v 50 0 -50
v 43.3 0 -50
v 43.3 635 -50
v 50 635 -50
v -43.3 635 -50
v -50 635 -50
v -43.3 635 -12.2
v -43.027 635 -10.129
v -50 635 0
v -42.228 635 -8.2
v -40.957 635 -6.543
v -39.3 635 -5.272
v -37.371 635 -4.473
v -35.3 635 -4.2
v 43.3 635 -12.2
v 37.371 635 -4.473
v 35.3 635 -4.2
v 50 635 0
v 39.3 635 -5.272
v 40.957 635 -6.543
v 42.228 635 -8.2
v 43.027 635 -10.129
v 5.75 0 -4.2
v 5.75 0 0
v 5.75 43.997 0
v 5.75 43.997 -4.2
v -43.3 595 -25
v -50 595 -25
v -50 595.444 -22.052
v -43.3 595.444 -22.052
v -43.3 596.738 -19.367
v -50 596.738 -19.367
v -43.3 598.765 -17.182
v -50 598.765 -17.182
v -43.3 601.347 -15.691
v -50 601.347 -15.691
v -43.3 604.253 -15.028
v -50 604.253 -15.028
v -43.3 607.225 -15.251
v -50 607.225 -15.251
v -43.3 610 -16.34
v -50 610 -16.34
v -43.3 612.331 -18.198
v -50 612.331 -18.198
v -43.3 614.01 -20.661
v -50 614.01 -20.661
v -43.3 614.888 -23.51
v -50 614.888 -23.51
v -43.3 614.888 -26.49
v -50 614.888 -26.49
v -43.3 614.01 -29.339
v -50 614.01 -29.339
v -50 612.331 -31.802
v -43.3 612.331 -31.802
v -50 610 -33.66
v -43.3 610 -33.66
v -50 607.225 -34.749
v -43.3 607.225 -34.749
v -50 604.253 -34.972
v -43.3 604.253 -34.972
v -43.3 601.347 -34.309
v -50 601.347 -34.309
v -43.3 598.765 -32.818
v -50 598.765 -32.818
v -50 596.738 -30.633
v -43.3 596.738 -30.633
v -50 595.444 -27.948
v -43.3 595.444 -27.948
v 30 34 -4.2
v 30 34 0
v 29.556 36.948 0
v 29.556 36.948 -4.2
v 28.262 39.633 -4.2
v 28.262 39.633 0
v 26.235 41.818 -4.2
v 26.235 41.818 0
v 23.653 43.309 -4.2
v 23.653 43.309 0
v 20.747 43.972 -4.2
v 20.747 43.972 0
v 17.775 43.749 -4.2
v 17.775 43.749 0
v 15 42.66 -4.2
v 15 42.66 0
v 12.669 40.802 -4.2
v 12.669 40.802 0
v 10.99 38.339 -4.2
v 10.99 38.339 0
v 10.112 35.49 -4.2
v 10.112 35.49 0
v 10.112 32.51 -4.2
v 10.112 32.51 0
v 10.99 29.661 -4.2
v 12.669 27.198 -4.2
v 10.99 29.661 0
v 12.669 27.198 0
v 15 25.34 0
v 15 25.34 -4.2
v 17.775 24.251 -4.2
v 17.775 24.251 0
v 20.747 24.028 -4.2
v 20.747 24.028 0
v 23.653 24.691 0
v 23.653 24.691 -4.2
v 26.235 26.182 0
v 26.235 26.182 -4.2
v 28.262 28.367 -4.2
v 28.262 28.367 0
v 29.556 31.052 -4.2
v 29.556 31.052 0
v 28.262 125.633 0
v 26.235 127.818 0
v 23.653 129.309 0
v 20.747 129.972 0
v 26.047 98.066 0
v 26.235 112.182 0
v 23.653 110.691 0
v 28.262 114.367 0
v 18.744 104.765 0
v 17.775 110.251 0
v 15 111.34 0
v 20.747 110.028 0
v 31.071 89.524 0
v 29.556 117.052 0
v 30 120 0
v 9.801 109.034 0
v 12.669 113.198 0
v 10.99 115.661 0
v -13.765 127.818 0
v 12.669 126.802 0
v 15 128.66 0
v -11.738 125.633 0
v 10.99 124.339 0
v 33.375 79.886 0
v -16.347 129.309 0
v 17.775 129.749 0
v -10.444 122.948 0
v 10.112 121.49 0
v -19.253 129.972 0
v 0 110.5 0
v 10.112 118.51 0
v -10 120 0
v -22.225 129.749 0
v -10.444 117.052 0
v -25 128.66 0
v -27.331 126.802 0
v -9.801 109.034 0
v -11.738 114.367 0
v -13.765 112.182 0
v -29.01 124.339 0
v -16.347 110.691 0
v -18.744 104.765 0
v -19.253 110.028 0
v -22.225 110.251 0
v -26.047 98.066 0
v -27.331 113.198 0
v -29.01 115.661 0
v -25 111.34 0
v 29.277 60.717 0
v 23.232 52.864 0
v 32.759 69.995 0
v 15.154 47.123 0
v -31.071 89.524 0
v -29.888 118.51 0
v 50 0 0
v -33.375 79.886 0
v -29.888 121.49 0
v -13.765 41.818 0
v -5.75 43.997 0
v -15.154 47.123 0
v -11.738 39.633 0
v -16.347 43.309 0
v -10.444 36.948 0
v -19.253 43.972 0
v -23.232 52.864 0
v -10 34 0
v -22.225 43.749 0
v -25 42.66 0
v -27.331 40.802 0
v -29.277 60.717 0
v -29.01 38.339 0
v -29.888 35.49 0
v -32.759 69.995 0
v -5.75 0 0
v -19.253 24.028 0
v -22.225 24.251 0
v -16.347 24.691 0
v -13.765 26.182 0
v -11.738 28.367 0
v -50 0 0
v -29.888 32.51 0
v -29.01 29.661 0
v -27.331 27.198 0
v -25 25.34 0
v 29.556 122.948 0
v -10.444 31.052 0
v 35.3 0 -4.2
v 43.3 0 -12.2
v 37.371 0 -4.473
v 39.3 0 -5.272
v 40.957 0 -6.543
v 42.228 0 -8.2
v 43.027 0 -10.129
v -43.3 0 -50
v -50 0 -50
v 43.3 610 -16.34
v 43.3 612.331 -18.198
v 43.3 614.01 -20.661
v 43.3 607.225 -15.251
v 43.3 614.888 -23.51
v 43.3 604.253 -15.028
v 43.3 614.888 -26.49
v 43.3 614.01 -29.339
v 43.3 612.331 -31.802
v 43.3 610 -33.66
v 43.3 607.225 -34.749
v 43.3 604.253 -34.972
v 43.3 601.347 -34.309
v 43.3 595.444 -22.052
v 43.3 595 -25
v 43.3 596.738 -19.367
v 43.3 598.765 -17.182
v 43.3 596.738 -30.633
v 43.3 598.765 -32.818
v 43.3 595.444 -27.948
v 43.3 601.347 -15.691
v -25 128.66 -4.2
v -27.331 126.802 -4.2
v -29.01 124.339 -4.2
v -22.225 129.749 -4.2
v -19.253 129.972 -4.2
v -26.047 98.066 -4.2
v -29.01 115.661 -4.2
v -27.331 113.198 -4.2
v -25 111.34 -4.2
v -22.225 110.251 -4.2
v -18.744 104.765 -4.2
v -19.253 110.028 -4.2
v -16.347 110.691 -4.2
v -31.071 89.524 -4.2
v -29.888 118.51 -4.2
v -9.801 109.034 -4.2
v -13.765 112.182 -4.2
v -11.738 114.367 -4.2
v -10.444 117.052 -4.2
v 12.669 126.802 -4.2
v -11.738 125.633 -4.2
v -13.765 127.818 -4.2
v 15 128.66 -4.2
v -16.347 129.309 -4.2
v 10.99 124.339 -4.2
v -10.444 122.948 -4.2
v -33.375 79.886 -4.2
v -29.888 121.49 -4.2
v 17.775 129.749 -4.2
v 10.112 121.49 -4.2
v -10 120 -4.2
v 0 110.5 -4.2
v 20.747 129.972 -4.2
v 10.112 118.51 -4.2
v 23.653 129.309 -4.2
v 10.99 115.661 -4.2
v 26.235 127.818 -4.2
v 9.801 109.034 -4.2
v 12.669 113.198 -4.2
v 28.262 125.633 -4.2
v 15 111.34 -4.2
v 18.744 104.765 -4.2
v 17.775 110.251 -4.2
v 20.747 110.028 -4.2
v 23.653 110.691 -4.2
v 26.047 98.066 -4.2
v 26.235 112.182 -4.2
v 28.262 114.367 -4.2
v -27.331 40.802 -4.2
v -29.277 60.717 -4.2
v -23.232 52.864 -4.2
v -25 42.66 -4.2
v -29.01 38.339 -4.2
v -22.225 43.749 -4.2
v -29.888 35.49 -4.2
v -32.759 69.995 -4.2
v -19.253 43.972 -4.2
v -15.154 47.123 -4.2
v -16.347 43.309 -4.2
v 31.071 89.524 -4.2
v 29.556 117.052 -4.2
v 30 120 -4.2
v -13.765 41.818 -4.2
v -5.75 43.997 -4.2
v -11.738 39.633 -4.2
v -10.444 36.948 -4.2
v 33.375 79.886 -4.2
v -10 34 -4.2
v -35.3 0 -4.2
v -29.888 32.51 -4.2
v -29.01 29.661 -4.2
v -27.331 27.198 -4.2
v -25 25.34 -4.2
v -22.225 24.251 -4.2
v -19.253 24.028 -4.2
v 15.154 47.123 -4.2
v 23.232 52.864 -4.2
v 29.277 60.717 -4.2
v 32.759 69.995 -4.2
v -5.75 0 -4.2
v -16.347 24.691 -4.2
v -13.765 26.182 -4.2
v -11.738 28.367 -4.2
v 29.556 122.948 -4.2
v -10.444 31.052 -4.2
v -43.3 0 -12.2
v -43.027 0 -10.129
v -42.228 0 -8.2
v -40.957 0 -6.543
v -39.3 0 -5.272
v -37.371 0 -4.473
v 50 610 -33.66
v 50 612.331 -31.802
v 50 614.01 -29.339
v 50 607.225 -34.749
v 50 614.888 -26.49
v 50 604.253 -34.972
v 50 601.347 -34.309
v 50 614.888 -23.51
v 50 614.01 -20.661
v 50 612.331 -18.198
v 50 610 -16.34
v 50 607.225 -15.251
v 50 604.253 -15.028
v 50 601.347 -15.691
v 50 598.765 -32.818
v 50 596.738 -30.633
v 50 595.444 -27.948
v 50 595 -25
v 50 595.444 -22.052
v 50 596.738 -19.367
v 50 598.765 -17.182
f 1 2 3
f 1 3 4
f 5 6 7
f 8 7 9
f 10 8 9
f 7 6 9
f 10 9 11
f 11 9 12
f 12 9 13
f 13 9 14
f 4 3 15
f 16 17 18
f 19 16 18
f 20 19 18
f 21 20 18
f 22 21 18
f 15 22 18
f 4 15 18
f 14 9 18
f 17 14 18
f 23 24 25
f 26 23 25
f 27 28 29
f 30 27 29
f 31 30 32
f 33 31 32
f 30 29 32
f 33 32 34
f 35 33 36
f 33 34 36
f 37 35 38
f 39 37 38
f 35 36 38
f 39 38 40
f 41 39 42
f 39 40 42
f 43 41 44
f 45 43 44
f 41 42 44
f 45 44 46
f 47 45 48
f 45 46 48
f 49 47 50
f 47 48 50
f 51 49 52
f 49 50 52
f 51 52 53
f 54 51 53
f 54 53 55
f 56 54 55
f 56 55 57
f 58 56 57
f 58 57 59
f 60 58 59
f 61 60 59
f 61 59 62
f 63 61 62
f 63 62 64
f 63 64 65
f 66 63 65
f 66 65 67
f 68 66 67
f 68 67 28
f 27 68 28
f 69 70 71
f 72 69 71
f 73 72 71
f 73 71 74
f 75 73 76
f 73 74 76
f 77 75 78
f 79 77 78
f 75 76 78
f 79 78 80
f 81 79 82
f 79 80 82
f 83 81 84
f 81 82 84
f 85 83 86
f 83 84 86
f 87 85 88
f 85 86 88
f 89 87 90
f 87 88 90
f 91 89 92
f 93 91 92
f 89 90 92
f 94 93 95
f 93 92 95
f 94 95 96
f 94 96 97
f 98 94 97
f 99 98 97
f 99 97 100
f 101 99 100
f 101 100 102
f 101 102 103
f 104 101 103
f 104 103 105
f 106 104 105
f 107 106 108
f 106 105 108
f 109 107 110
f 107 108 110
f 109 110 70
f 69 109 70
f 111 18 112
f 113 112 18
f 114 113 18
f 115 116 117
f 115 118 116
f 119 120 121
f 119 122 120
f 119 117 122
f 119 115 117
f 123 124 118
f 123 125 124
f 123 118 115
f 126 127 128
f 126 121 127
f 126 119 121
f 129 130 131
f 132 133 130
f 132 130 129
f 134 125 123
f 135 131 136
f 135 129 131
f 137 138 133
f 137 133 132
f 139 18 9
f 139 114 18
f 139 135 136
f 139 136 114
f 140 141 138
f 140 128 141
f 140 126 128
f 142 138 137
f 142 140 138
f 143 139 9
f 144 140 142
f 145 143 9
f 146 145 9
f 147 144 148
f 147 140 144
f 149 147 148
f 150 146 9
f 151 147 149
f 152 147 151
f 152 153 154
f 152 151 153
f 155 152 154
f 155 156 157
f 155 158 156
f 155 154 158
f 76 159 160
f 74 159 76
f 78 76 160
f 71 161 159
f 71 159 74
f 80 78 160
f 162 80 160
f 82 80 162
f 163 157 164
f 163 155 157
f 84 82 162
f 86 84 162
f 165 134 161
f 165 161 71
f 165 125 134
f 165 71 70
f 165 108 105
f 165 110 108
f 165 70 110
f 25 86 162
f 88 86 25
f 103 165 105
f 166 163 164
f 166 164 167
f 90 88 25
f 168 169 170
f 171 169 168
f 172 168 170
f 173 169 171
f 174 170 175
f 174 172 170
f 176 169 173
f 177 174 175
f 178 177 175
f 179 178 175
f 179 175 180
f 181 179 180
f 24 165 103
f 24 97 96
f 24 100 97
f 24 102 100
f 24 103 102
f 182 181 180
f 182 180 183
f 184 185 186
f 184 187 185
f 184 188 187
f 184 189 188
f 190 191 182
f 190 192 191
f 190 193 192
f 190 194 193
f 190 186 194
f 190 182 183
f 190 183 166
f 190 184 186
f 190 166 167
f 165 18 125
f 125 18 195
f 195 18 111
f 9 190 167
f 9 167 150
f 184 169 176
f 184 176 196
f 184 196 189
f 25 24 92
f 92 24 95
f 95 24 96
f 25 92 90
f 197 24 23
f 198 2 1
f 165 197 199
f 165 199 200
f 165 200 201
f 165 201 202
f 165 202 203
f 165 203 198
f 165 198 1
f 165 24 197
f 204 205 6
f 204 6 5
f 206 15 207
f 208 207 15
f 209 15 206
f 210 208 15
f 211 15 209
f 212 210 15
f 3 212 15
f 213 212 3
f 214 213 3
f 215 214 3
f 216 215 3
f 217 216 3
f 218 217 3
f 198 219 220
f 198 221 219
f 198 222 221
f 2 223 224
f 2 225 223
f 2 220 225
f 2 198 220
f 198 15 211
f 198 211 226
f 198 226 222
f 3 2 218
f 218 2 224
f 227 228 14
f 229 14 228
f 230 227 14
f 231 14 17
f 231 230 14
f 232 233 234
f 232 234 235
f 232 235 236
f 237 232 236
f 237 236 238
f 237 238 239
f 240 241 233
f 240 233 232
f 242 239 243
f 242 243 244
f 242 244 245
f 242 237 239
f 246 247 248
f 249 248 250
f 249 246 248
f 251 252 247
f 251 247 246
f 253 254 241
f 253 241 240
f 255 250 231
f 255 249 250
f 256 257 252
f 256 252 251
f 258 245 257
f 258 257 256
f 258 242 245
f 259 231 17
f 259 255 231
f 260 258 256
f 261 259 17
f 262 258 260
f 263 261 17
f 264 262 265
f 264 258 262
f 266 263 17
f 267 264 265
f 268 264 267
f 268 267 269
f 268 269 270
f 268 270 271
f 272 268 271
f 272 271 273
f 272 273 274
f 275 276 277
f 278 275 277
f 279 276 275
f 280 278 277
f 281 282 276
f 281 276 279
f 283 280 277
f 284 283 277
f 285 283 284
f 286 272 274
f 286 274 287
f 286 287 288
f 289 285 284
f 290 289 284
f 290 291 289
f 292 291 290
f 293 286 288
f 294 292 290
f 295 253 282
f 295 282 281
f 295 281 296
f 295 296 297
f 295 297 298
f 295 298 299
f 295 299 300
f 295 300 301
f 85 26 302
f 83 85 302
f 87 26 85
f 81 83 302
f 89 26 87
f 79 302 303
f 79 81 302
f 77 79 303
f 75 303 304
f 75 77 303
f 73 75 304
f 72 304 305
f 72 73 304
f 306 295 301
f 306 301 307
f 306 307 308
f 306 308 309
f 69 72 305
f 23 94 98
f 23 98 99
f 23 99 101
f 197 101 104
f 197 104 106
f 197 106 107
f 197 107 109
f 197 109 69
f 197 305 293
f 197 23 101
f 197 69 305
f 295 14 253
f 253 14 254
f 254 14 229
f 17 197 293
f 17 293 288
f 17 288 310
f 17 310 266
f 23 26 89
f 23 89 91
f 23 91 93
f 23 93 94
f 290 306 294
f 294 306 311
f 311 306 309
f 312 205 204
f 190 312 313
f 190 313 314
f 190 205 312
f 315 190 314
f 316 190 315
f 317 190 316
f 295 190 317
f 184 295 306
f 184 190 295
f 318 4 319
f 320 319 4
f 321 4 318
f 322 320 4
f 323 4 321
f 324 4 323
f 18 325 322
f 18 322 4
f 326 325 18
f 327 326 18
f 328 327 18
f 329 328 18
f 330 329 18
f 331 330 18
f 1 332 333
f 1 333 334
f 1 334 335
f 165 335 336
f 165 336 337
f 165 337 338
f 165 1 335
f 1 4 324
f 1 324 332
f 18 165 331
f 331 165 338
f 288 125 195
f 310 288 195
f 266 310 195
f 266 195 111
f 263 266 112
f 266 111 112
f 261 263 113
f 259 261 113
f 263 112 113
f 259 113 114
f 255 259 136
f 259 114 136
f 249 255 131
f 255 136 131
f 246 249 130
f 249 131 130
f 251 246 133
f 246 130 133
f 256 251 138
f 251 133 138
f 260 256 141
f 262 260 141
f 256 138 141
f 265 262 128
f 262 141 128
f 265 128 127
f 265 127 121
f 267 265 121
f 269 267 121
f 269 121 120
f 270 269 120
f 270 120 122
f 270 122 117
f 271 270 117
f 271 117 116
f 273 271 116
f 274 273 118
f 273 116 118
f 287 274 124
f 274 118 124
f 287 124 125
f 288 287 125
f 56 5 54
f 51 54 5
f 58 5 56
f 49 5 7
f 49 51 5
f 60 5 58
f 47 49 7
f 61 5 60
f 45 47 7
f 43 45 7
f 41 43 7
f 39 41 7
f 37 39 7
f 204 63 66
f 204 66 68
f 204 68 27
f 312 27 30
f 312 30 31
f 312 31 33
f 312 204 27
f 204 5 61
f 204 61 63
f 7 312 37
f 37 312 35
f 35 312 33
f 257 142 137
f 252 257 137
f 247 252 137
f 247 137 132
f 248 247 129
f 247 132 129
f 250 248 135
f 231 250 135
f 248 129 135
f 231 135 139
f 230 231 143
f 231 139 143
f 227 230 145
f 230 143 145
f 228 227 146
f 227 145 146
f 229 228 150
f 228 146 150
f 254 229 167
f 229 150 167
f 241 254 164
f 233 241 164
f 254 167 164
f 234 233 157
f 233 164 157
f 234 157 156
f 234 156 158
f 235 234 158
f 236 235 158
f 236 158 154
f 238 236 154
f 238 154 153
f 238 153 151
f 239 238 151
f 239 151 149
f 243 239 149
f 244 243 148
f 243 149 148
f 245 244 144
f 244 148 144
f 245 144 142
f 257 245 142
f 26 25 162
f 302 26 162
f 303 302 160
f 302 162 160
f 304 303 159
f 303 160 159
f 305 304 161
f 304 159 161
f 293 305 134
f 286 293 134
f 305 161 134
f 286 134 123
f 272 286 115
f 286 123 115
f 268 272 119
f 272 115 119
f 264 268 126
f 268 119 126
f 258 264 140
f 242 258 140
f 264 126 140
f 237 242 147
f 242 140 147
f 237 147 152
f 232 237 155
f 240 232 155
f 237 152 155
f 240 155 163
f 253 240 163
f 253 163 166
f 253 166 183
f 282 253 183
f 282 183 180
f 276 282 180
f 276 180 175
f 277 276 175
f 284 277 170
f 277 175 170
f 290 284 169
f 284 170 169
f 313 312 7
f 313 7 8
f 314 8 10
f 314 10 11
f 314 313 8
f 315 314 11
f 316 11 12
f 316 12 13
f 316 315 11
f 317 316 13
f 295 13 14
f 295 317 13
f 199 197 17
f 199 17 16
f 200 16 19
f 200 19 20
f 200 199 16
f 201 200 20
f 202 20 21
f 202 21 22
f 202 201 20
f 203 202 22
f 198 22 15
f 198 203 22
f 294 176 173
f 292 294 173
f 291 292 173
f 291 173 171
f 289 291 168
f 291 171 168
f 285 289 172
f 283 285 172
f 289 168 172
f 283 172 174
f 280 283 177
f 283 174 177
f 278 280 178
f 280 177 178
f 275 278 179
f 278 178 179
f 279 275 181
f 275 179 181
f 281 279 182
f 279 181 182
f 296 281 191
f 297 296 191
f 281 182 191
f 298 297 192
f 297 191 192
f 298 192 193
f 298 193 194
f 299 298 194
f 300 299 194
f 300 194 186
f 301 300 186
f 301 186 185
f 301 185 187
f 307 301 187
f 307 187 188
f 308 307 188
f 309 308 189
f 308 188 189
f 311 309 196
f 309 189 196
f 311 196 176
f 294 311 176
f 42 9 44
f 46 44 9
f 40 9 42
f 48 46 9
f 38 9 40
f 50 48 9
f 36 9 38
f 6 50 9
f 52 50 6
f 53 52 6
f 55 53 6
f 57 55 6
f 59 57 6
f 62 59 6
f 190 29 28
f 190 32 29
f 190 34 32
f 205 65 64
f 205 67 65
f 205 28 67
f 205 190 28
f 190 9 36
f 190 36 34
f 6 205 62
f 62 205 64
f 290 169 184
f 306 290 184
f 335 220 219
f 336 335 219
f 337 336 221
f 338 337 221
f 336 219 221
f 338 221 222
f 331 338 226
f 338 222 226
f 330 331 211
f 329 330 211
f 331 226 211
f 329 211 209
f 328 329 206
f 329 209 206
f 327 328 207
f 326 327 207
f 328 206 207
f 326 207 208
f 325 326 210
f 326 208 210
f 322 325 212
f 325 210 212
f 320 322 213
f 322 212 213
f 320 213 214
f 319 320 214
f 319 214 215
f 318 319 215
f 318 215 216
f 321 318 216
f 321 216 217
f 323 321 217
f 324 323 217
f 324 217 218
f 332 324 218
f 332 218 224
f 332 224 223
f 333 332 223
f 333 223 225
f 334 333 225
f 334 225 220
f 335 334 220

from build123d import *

# Parameters (mm, degrees)
F1_DEPTH = 635
F3_DEPTH = 4.2
F4_R     = 10
F5_DEPTH = 4.2
F6_R     = 10
F7_DEPTH = 100


with BuildPart() as f1:
    # F0 (on Front) → F1 (new body)
    with BuildSketch(Plane.XZ):
        with BuildLine():
            Line((50, 0), (0, 0))
            Line((0, 0), (-50, 0))
            Line((-50, 0), (-50, -50))
            Line((-50, -50), (-43.3, -50))
            Line((-43.3, -50), (-43.3, -12.2))
            ThreePointArc((-43.3, -12.2), (-40.956854, -6.543146), (-35.3, -4.2))
            Line((-35.3, -4.2), (0, -4.2))
            Line((0, -4.2), (35.3, -4.2))
            ThreePointArc((35.3, -4.2), (40.956854, -6.543146), (43.3, -12.2))
            Line((43.3, -12.2), (43.3, -50))
            Line((43.3, -50), (50, -50))
            Line((50, -50), (50, 0))
        make_face()
    extrude(amount=-F1_DEPTH)

    # F2 (on face) → F3 (cut, through all)
    with BuildSketch(Plane.XY):
        with BuildLine():
            Line((5.75, 0), (5.75, 43.997159))
            ThreePointArc((5.75, 43.997159), (0, 110.5), (-5.75, 43.997159))
            Line((-5.75, 43.997159), (-5.75, 0))
            Line((-5.75, 0), (5.75, 0))
        make_face()
    extrude(amount=-F3_DEPTH, mode=Mode.SUBTRACT)

    # F4 (on face) → F5 (cut, through all)
    with BuildSketch(Plane.XY):
        with Locations((-20, 34)):
            Circle(F4_R)
        with Locations((-20, 120)):
            Circle(F4_R)
        with Locations((20, 34)):
            Circle(F4_R)
        with Locations((20, 120)):
            Circle(F4_R)
    extrude(amount=-F5_DEPTH, mode=Mode.SUBTRACT)

    # F6 (on face) → F7 (cut, through all)
    with BuildSketch(Plane(origin=(-50, 0, 0), x_dir=(0, -1, 0), z_dir=(-1, 0, 0))):
        with Locations((-605, -25)):
            Circle(F6_R)
    extrude(amount=-F7_DEPTH, mode=Mode.SUBTRACT)


solid = f1.part
